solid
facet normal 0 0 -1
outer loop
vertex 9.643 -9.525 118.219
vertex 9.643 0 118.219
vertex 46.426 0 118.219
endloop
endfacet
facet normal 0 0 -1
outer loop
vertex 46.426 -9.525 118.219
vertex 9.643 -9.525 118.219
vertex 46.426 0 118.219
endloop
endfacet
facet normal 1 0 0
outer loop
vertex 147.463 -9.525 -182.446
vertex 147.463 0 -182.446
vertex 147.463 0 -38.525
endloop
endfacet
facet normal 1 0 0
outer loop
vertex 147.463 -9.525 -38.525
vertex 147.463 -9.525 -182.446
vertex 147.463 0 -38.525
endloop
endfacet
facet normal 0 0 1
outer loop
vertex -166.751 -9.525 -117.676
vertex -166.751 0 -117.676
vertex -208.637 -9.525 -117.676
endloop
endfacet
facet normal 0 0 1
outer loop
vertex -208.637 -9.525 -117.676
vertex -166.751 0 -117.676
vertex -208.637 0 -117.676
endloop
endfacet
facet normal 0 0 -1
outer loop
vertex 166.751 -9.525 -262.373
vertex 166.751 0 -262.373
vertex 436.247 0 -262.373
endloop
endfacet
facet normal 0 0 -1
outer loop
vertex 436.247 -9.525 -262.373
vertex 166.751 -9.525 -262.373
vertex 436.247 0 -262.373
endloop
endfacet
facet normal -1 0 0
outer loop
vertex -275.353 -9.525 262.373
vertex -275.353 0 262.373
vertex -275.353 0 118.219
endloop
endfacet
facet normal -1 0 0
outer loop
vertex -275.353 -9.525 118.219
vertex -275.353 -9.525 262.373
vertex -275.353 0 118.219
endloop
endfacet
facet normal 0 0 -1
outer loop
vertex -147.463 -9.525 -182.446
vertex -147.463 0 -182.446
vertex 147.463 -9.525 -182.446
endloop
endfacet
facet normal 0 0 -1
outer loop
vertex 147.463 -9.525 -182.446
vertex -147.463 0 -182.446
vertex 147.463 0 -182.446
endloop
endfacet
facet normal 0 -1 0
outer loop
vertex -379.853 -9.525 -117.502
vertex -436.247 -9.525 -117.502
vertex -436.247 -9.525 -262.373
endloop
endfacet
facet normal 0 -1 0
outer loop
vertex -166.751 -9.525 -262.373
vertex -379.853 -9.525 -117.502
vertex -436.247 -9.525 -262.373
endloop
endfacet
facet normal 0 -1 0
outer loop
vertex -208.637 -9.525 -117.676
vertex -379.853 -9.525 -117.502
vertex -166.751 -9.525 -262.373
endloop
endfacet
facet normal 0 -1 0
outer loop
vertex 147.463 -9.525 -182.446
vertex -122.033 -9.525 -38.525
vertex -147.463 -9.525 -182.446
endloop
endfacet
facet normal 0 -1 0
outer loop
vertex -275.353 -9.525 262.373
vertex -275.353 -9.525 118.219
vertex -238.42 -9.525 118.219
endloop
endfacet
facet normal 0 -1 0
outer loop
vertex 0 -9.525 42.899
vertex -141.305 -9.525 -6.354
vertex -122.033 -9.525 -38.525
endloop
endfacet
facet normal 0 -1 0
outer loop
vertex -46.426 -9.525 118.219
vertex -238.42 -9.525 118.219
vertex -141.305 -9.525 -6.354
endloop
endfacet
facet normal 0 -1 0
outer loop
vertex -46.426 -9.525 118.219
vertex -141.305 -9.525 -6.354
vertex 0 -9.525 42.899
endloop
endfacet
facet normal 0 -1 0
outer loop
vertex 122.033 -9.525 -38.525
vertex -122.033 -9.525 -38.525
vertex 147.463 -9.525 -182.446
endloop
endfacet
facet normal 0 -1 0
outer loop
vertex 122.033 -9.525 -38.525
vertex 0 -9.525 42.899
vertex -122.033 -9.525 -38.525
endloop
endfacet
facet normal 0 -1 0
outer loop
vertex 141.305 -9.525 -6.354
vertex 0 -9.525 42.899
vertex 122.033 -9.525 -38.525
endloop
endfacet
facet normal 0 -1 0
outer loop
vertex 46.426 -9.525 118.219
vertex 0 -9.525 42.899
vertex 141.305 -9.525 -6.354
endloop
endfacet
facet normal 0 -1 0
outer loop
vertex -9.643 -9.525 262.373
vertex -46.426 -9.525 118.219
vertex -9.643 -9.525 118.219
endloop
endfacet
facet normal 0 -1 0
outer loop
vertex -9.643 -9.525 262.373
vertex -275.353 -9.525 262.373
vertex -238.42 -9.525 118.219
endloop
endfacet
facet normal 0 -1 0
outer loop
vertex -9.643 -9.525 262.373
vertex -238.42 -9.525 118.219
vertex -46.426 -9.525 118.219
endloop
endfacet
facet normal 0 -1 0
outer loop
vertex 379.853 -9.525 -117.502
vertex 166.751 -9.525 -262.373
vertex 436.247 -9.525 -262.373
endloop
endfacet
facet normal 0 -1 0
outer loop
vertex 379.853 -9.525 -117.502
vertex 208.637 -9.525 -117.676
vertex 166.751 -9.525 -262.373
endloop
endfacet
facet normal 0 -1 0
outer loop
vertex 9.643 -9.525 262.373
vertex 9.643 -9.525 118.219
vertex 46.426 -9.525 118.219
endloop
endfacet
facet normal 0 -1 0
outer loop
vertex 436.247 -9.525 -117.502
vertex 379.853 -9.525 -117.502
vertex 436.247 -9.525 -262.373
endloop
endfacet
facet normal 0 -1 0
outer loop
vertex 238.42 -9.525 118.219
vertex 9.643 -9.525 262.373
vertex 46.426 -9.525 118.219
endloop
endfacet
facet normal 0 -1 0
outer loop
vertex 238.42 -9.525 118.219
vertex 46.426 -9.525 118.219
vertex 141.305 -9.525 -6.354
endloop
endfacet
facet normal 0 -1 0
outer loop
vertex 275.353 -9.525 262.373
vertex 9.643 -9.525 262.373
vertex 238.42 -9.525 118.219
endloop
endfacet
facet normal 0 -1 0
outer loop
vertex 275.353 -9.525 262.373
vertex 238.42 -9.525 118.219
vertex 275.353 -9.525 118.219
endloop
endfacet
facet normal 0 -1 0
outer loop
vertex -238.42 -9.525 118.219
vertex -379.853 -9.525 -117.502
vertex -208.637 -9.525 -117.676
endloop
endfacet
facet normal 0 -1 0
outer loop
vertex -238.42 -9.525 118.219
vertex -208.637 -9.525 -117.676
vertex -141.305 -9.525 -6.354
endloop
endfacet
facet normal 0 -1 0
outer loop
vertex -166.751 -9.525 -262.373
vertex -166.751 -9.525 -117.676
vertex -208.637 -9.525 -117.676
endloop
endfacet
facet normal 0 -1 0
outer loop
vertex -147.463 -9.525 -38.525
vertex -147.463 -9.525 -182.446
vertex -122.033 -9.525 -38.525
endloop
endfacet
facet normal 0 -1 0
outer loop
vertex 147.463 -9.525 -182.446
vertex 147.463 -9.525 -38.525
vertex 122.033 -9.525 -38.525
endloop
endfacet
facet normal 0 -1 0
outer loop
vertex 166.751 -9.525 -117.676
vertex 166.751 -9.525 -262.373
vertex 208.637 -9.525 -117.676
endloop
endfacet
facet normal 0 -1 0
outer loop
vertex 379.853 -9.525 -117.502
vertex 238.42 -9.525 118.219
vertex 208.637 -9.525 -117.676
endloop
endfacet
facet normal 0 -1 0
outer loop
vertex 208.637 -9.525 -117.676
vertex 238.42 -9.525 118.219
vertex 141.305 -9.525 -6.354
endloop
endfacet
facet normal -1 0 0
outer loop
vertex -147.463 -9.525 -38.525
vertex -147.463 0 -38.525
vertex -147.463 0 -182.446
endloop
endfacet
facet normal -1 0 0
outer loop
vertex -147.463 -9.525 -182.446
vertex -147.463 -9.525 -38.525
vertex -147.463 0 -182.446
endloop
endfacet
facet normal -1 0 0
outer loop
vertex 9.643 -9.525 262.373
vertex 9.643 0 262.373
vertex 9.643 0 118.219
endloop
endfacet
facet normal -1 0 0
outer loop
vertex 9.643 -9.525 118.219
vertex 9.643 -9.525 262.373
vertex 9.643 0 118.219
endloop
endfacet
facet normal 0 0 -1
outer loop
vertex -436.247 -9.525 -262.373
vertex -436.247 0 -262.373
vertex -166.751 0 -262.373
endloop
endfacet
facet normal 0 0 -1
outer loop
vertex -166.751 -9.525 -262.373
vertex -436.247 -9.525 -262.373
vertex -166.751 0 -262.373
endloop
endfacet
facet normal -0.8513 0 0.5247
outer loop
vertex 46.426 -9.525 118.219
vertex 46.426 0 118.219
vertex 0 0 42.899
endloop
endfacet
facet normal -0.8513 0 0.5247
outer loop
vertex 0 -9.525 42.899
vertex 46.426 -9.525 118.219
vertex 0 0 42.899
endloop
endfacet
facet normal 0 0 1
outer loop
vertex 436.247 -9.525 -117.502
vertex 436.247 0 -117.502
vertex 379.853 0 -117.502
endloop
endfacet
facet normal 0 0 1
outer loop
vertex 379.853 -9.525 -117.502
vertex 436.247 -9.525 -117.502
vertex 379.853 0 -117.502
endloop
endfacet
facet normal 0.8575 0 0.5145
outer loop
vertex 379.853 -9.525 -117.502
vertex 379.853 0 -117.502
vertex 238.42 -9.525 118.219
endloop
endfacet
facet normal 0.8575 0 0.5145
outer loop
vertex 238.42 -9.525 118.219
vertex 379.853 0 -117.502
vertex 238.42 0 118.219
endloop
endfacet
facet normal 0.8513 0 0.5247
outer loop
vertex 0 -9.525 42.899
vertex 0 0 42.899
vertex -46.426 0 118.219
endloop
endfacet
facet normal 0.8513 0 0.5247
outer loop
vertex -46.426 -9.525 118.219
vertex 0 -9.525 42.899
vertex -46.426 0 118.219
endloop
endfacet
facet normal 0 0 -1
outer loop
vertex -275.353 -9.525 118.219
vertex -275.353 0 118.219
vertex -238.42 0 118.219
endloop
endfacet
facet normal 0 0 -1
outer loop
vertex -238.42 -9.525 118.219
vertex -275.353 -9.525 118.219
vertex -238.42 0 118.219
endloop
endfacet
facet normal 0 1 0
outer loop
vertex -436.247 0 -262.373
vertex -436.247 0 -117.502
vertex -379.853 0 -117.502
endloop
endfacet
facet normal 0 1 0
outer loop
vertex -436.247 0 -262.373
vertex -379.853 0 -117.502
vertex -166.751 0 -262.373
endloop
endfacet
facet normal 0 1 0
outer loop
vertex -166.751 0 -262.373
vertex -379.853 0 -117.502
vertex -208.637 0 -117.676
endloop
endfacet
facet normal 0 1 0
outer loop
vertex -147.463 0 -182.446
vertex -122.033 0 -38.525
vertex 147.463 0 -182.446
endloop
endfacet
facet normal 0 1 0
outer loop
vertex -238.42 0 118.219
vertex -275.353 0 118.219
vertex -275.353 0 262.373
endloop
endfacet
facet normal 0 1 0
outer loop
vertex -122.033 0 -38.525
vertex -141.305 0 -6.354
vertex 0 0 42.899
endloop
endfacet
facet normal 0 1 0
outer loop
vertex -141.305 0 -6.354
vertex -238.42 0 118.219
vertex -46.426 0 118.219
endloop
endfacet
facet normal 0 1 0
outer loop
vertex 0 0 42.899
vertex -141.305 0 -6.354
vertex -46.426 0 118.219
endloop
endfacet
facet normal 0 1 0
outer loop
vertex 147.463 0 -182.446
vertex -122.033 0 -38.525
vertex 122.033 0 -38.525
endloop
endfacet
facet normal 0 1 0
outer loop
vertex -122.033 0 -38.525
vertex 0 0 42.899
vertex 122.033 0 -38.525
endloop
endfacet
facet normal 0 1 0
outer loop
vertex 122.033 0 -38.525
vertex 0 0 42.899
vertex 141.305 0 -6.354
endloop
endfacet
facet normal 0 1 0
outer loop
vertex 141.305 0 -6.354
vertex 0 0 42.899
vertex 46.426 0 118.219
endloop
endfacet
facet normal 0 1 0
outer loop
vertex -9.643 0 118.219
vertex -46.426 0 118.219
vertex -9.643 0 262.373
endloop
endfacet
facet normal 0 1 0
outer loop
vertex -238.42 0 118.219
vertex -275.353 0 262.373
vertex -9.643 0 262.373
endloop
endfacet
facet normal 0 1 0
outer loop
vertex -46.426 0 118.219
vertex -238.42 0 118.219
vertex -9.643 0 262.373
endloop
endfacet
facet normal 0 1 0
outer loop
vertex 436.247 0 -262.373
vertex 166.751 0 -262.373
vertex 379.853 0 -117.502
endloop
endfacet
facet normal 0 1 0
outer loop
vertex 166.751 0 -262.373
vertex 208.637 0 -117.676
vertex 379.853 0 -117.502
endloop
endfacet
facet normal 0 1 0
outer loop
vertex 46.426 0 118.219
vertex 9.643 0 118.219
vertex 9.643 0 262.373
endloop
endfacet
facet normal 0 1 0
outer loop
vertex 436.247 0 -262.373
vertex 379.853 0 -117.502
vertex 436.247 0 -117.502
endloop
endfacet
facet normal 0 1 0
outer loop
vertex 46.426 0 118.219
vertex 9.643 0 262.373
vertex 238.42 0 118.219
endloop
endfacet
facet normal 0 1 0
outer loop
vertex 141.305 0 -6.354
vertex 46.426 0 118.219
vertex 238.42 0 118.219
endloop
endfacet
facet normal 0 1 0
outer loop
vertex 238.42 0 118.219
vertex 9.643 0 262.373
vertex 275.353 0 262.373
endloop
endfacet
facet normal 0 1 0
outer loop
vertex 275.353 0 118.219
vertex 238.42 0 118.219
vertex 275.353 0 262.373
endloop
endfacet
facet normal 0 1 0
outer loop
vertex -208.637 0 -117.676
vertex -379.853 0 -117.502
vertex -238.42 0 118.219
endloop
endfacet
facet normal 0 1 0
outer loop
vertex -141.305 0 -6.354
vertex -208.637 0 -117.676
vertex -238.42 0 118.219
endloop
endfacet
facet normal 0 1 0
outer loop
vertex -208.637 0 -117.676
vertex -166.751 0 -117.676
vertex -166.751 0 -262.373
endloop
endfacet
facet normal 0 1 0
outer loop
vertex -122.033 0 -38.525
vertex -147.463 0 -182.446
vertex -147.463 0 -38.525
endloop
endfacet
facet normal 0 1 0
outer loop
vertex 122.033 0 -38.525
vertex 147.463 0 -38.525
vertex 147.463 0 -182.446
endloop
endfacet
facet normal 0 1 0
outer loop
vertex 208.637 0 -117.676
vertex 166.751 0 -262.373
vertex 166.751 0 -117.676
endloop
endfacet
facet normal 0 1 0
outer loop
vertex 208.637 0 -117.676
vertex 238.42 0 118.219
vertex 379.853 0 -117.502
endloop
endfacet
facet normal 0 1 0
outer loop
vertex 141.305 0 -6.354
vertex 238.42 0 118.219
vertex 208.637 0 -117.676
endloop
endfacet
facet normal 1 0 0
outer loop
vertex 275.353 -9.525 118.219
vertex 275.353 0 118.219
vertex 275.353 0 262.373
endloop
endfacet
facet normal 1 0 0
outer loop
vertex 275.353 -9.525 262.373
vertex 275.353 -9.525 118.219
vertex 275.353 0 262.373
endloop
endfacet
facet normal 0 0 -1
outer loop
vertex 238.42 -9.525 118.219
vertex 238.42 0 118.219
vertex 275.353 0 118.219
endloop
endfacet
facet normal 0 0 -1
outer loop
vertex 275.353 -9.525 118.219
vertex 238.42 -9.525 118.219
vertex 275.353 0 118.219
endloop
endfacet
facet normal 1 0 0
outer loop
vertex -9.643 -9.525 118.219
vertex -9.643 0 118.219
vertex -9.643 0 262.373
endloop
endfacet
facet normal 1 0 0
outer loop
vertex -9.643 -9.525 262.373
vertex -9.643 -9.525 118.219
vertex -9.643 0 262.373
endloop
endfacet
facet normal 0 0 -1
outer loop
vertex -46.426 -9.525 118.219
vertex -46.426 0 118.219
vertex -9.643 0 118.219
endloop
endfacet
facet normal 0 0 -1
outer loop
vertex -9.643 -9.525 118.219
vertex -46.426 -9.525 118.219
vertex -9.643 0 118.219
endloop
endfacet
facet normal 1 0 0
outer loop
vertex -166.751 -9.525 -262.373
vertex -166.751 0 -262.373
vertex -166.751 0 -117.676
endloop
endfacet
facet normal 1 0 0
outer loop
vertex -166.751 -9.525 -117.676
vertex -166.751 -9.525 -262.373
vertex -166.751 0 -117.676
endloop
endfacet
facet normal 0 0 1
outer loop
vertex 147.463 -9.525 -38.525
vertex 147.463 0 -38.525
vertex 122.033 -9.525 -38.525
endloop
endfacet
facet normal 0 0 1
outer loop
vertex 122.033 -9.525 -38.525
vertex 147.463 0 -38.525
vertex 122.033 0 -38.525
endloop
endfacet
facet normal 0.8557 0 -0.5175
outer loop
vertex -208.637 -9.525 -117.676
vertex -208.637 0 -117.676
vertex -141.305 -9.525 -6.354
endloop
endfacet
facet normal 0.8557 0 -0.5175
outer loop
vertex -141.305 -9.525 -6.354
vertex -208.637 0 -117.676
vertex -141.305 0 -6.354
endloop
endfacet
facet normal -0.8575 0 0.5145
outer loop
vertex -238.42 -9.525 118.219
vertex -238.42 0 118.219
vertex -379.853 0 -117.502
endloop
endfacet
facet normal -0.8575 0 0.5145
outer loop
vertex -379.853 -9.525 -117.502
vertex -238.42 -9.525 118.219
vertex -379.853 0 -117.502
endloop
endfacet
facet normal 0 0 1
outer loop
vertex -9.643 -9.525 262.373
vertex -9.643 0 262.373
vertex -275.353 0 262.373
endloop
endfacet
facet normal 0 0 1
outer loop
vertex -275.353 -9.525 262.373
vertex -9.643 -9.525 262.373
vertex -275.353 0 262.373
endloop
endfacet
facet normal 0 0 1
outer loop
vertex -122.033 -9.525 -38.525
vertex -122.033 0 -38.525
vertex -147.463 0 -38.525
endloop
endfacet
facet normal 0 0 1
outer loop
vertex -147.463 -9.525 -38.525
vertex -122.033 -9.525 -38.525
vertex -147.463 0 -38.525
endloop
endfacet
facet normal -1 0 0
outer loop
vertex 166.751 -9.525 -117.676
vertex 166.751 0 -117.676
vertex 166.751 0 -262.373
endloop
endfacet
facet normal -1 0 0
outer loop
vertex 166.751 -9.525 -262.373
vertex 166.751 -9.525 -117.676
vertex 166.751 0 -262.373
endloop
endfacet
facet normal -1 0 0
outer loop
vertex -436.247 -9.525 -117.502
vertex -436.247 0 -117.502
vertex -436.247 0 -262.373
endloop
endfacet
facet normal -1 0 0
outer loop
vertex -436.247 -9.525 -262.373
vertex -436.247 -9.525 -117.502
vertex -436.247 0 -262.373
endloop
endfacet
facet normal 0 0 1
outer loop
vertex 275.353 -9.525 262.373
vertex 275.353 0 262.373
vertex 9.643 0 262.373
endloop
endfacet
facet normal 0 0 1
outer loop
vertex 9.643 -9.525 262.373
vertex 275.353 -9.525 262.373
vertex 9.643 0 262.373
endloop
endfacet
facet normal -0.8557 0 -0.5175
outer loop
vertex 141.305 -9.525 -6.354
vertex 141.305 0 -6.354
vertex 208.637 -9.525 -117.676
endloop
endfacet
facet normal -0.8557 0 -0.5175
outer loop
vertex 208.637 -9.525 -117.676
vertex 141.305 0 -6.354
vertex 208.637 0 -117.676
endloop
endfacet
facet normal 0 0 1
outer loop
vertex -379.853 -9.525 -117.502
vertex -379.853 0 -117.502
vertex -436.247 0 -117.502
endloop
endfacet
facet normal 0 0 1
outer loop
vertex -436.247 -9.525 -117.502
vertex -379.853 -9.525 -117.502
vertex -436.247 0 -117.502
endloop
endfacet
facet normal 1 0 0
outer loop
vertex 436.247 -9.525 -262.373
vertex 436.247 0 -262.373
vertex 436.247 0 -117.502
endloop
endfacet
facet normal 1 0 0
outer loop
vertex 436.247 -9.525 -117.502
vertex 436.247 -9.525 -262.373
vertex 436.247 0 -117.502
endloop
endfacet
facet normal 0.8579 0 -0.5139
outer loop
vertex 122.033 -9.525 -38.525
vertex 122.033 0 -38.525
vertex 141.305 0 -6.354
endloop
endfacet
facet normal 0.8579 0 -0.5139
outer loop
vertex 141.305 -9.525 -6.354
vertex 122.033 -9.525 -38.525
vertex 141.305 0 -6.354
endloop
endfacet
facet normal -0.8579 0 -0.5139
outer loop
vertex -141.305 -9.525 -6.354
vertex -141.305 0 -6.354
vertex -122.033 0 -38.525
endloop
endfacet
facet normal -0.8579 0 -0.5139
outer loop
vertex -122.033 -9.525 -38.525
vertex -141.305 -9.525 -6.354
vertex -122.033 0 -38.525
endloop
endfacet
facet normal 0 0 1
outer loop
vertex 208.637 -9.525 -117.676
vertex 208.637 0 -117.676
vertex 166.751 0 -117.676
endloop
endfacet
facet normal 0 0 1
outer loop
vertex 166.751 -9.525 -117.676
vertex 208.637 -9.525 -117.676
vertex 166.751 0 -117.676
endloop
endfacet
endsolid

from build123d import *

# Parameters (mm, degrees)
F1_DEPTH = 9.525


with BuildPart() as f1:
    # F0 (on Front) → F1 (new body)
    with BuildSketch(Plane.XZ):
        Polygon((46.425866, 118.218941), (0, 42.89867), (-46.425841, 118.218941), (-9.642704, 118.218941), (-9.642704, 262.373212), (-275.353094, 262.373212), (-275.353094, 118.218941), (-238.419894, 118.218941), (-379.852555, -117.502153), (-436.247438, -117.502153), (-436.247438, -262.373186), (-166.750771, -262.373186), (-166.750771, -117.675508), (-208.63687, -117.675508), (-141.304645, -6.354039), (-122.033462, -38.525171), (-147.4629, -38.525171), (-147.4629, -182.446219), (147.4629, -182.446219), (147.4629, -38.525171), (122.033487, -38.525171), (141.30467, -6.354039), (208.636895, -117.675508), (166.750797, -117.675508), (166.750797, -262.373186), (436.247438, -262.373186), (436.247438, -117.502153), (379.852555, -117.502153), (238.419919, 118.218941), (275.35312, 118.218941), (275.35312, 262.373212), (9.642729, 262.373212), (9.642729, 118.218941), align=None)
    extrude(amount=F1_DEPTH)


solid = f1.part
